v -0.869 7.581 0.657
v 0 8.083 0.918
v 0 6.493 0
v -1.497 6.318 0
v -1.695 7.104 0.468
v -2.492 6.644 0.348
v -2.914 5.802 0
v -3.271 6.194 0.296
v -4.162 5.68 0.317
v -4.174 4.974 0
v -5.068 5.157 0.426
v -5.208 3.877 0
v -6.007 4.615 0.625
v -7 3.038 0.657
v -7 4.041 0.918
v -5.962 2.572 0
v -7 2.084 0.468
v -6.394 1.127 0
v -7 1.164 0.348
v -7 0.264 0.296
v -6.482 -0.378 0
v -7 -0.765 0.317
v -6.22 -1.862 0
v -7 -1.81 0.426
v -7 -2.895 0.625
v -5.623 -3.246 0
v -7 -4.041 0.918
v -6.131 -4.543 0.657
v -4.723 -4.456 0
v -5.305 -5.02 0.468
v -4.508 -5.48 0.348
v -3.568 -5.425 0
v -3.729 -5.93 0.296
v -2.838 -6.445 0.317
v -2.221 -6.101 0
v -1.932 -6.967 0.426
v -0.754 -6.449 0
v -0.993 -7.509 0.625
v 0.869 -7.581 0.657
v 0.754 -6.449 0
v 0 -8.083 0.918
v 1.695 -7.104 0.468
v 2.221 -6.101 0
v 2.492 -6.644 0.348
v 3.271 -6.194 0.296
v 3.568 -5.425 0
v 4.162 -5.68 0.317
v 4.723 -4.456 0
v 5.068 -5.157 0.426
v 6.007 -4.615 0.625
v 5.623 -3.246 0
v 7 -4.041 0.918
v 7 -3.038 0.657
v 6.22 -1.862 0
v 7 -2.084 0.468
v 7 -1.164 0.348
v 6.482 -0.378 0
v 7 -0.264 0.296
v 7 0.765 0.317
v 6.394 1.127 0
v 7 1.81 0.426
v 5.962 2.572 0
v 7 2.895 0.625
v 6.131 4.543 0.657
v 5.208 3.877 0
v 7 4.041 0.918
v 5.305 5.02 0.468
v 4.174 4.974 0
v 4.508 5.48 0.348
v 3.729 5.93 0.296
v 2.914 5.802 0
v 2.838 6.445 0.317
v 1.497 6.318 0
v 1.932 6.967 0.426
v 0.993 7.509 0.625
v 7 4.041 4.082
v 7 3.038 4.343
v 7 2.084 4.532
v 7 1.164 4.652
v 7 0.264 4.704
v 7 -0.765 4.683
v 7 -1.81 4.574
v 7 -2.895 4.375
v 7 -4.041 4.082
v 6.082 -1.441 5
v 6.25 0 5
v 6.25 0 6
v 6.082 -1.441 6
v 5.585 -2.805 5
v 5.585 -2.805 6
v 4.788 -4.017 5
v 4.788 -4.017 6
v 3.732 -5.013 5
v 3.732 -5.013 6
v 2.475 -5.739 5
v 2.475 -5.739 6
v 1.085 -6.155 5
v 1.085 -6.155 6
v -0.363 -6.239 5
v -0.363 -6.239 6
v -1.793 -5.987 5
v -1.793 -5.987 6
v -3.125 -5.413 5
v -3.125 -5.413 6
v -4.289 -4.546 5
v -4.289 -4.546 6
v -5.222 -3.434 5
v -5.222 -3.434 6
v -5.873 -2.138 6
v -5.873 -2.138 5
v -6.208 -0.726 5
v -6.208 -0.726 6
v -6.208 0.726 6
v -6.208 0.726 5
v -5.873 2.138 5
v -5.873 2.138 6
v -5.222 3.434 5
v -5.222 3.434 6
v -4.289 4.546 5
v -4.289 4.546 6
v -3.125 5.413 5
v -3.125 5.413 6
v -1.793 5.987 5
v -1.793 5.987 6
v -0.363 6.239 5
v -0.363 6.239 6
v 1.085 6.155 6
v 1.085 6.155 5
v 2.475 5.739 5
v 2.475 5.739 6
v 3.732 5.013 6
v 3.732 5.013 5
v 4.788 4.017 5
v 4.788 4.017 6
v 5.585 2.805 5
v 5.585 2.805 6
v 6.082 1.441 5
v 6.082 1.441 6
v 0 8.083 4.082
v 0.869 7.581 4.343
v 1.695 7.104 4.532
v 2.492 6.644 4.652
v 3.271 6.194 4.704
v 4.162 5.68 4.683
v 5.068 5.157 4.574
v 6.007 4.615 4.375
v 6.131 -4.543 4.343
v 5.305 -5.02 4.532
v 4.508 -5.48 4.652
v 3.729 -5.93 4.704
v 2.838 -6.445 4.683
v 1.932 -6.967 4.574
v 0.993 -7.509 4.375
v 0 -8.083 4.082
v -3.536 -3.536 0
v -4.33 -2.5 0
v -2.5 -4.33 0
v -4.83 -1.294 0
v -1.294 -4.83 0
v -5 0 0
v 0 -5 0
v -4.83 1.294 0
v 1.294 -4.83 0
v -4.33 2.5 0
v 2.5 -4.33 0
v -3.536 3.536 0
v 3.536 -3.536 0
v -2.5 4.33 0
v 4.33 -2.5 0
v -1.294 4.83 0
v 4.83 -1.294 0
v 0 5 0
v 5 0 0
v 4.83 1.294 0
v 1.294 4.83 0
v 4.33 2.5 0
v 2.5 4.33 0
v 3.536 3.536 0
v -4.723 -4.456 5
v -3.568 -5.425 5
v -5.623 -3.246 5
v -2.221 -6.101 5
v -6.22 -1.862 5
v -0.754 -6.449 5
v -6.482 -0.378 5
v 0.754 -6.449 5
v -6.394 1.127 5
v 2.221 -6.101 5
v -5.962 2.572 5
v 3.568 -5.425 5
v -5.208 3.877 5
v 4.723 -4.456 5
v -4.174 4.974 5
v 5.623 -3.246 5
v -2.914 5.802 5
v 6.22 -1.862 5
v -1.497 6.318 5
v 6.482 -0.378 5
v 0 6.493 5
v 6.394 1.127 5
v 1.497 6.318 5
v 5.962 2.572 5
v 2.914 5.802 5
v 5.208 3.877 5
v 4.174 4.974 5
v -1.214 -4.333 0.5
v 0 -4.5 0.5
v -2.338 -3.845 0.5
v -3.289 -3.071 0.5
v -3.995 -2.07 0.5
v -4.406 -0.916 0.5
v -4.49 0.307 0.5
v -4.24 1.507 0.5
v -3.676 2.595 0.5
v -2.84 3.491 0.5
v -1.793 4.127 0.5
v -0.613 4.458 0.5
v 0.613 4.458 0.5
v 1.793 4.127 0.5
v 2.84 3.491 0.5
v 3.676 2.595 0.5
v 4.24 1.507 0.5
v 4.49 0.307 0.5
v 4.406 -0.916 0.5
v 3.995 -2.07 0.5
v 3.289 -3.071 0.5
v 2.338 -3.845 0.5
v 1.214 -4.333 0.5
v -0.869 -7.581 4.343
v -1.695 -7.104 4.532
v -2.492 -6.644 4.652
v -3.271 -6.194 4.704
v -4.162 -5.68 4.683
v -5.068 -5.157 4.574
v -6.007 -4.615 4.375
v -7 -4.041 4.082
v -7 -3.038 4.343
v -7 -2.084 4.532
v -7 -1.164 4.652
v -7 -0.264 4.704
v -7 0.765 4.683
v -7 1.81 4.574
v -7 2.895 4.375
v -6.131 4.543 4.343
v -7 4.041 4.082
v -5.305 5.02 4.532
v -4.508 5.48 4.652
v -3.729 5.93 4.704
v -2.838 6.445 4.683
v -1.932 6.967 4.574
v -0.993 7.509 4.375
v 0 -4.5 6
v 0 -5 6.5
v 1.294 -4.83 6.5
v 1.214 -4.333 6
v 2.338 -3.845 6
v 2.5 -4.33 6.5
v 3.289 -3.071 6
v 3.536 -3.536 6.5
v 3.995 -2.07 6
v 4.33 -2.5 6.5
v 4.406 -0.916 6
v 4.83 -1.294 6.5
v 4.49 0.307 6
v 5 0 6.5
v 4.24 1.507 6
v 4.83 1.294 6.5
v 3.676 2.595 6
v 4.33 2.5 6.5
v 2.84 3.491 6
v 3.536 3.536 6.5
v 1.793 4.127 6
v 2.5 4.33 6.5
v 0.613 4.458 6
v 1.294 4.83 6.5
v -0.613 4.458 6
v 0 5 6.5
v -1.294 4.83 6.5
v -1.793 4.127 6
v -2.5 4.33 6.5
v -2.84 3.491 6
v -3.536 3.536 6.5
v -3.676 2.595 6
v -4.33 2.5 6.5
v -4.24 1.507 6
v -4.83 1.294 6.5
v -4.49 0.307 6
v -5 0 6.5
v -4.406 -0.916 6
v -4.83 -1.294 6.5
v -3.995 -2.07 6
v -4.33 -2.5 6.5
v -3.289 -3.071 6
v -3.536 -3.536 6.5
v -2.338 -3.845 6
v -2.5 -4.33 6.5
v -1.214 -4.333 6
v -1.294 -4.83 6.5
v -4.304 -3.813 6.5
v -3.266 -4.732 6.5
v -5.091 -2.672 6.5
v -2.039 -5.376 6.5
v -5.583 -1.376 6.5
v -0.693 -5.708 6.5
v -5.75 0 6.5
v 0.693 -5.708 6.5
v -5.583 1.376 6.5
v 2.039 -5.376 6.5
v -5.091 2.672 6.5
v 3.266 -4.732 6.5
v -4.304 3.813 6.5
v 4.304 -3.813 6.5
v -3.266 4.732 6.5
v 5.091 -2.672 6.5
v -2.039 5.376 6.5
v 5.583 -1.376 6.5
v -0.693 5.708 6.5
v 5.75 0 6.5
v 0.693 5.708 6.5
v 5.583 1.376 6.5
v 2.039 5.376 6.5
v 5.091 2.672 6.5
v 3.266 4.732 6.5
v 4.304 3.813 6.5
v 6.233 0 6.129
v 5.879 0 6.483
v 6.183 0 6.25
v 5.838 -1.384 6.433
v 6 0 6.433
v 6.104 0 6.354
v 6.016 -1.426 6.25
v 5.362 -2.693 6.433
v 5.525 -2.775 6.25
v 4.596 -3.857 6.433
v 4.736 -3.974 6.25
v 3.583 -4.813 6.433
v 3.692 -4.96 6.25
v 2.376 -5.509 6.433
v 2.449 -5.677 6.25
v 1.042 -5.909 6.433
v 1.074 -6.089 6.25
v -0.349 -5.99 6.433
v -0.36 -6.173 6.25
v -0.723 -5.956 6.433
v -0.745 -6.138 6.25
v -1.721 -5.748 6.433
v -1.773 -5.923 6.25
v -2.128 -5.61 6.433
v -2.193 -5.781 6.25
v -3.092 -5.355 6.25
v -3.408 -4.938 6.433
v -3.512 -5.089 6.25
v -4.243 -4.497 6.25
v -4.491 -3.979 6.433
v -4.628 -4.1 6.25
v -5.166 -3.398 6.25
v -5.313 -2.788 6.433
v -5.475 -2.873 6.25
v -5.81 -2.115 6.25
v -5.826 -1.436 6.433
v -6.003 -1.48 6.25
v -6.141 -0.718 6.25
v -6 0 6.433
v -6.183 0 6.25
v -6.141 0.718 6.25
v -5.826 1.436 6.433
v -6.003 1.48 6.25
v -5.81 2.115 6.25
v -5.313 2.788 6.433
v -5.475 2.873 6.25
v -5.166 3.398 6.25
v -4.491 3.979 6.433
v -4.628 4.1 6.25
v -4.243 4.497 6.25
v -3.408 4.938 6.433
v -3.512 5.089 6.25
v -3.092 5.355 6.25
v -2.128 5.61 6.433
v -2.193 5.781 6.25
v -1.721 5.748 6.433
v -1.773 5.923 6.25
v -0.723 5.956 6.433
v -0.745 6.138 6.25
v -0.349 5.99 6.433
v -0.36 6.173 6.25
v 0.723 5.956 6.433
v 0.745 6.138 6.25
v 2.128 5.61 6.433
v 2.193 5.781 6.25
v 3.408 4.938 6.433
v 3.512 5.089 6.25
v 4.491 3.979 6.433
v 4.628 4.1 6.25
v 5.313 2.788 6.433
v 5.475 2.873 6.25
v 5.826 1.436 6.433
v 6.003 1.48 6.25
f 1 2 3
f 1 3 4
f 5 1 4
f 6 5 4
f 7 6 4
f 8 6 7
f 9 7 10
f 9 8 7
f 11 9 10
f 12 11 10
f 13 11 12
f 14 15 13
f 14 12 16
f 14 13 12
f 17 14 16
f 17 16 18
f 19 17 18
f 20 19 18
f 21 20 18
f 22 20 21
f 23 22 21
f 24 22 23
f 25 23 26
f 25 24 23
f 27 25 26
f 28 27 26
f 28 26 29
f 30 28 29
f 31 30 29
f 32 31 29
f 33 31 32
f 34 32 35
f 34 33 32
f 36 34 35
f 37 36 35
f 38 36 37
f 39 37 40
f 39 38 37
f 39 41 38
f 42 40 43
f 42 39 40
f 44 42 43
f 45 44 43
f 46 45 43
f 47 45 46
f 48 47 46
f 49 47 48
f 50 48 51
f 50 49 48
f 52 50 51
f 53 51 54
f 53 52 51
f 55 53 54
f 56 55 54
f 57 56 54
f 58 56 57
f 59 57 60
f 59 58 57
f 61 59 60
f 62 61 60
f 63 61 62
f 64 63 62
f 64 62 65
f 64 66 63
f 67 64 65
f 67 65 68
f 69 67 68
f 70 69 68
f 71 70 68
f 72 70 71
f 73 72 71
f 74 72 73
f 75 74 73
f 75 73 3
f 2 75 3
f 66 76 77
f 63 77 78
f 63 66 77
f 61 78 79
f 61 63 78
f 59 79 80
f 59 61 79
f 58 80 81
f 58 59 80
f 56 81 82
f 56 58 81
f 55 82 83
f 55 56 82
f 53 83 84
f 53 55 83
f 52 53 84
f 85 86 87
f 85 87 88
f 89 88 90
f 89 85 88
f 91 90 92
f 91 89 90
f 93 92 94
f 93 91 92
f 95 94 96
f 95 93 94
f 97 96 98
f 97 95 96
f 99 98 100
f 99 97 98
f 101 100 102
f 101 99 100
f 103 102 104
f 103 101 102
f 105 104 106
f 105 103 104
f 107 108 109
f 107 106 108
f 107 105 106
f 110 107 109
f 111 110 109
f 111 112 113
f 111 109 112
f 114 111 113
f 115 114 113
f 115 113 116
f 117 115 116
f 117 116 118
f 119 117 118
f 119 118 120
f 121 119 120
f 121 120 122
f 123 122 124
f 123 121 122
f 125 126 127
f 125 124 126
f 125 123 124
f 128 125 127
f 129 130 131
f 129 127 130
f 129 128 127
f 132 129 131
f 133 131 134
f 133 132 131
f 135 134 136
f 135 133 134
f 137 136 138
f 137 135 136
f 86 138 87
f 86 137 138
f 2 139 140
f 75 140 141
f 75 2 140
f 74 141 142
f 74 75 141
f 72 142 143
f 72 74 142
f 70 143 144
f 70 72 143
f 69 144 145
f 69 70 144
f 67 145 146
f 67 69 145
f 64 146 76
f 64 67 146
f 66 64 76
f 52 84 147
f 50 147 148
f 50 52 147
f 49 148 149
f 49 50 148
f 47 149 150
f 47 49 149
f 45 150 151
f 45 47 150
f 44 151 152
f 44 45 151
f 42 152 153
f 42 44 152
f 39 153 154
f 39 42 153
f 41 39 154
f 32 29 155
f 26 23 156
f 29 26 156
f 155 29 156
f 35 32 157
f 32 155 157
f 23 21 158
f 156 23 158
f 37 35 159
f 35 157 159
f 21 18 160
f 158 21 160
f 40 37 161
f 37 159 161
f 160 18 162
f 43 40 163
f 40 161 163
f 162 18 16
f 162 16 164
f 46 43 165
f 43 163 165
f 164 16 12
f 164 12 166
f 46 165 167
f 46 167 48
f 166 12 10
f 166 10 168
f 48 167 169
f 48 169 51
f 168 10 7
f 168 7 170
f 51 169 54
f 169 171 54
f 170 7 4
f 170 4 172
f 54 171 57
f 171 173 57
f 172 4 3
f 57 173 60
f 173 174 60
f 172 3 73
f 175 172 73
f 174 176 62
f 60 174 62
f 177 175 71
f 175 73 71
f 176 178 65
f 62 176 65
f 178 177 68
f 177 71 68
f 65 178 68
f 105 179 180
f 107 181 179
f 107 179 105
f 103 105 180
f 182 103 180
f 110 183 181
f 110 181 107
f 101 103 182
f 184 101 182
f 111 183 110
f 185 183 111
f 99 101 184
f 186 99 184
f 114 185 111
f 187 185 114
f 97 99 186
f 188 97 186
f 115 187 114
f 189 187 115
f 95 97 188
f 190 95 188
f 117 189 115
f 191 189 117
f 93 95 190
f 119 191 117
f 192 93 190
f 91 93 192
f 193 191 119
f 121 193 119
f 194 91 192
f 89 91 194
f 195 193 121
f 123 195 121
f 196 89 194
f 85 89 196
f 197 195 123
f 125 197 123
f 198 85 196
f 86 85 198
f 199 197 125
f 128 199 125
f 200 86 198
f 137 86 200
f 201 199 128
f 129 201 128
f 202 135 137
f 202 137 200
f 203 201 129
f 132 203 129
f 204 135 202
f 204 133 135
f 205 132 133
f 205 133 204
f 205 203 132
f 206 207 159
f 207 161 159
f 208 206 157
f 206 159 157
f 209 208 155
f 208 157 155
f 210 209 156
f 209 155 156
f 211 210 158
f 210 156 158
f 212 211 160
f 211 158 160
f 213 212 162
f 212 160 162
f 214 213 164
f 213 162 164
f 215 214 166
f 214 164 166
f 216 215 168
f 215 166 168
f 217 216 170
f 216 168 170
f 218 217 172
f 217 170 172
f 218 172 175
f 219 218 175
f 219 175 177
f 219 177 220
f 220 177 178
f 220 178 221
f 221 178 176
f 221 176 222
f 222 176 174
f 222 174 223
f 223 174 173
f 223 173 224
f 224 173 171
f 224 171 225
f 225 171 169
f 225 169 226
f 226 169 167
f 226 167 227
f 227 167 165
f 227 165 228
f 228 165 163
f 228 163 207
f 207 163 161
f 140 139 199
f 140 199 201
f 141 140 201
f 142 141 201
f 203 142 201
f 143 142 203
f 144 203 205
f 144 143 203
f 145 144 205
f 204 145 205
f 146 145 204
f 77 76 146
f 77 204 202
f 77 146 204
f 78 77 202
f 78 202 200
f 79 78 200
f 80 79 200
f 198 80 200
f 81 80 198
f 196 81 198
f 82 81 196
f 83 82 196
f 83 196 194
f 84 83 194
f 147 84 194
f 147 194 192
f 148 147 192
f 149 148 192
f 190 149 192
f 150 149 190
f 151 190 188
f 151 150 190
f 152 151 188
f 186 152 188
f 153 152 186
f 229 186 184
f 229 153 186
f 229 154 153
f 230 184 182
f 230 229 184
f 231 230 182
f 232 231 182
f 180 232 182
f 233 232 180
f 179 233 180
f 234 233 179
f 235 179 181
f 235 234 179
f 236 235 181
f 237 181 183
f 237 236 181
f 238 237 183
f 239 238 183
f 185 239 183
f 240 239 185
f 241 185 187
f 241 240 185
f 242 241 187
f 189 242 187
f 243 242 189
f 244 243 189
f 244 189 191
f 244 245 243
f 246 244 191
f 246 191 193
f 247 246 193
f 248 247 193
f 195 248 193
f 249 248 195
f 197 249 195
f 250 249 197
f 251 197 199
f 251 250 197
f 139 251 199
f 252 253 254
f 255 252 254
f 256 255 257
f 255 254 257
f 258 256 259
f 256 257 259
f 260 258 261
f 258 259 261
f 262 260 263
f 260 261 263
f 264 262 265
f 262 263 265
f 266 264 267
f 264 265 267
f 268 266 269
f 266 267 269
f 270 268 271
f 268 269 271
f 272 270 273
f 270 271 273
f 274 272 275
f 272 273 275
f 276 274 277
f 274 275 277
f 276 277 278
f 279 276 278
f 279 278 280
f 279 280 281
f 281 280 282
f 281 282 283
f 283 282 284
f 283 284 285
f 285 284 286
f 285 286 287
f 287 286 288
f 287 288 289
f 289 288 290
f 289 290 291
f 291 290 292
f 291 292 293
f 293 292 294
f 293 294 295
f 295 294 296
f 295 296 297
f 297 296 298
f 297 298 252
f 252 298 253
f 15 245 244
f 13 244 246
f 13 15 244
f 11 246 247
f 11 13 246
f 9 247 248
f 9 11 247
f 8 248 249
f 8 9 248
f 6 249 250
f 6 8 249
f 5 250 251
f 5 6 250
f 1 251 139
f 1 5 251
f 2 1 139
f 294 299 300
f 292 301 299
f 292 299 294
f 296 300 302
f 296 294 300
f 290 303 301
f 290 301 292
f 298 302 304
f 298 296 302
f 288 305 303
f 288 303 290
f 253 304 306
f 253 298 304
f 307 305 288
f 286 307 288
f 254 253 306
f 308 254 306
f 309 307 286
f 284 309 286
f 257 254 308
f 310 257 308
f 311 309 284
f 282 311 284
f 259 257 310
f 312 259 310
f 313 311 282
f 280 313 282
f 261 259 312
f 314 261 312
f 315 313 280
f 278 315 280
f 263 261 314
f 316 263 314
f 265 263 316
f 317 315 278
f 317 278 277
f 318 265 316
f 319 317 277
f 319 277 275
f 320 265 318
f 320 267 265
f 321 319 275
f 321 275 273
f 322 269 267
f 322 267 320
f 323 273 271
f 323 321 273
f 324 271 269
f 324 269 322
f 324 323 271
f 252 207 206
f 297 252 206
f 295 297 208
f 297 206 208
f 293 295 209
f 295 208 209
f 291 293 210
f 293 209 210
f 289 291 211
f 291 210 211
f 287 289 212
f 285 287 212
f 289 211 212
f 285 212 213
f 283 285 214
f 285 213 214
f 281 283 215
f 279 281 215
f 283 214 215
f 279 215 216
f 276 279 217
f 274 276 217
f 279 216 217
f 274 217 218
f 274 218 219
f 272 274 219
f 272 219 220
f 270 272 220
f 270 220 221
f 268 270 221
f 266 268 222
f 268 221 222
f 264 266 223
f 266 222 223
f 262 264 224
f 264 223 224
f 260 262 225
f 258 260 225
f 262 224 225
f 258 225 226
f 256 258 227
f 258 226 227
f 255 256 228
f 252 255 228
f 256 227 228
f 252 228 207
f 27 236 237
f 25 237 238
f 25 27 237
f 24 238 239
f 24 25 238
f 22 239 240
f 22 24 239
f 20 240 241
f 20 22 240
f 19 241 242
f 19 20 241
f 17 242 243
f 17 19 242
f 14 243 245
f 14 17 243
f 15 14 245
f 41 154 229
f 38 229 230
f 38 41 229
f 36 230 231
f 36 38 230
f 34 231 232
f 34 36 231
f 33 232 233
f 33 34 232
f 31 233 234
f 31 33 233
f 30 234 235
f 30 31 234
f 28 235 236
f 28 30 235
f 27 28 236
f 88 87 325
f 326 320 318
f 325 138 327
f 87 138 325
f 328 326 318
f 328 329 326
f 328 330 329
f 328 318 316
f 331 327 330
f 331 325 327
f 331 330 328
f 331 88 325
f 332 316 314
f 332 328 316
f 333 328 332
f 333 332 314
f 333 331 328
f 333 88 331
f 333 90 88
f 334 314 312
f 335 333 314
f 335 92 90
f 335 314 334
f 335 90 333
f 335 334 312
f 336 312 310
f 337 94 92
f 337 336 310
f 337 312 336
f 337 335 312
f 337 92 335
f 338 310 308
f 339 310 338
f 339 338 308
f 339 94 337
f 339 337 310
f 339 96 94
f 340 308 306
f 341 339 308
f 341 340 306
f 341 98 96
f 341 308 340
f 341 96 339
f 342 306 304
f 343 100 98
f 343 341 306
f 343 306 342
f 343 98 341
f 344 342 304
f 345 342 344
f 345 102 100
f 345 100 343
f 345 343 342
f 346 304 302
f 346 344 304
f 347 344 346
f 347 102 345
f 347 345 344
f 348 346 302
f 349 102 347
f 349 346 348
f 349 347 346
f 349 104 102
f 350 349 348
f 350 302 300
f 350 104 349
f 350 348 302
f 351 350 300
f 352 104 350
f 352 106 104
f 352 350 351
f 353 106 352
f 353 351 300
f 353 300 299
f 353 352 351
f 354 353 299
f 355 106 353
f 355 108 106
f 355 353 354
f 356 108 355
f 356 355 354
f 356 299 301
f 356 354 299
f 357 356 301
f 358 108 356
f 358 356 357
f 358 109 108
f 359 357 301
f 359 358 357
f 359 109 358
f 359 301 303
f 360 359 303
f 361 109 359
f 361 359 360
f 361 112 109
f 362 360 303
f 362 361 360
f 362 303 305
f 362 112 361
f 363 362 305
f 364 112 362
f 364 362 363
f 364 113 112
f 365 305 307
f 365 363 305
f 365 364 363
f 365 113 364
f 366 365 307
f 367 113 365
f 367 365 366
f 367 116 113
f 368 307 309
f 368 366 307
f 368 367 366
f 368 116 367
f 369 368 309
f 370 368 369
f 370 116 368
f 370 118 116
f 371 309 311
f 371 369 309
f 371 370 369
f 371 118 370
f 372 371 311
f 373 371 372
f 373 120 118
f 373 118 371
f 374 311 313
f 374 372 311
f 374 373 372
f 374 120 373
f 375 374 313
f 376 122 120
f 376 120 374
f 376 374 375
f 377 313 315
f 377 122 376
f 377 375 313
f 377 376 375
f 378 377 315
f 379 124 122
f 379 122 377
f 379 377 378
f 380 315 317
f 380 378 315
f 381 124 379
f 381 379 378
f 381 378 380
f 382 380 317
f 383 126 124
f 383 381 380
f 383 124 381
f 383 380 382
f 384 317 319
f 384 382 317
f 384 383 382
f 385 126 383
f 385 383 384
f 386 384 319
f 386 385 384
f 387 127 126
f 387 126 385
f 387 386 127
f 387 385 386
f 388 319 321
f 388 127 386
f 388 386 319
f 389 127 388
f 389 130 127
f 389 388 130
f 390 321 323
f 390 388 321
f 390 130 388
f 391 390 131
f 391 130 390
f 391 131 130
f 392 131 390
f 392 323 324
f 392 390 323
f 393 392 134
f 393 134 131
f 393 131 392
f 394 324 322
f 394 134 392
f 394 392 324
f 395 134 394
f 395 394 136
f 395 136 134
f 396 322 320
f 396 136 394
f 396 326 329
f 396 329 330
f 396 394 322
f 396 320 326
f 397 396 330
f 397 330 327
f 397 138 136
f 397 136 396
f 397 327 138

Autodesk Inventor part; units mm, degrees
ref_plane "YZ Plane" through (0, 0, 0) normal (1, 0, 0) x (0, 1, 0)
ref_plane "XZ Plane" through (0, 0, 0) normal (0, 1, 0) x (-1, 0, 0)
sketch "Schizzo1" plane through (0, 0, 0) normal (0, 0, 1) x (1, 0, 0)
  line L0 (0, 8.0829) -> (7, 4.0415)
  line L1 (7, 4.0415) -> (7, -4.0415)
  line L2 (7, -4.0415) -> (0, -8.0829)
  line L3 (0, -8.0829) -> (-7, -4.0415)
  line L4 (-7, -4.0415) -> (-7, 4.0415)
  line L5 (-7, 4.0415) -> (0, 8.0829)
  point P0 (0, 0)
  point P1 (0, 0)
  dimension "d0" = 14
extrude "Estrusione1" add sketch "Schizzo1" along normal blind 5
sketch "Schizzo2" plane through (0, 0, 5) normal (0, 0, 1) x (1, 0, 0)
  circle A0 centre (0, 0) radius 6.25
  dimension "d5" = 12.5
extrude "Estrusione2" add sketch "Schizzo2" along normal blind 1.5
sketch "Schizzo3" plane through (0, 0, 0) normal (1, 0, 0) x (0, 1, 0)
  line L0 (8.0829, 5) -> (4.0415, 5) projected
  line L1 (4.0415, 0) -> (4.0415, 5) projected
  line L2 (8.0829, 0) -> (4.0415, 0) projected
  line L3 (8.0829, 0) -> (8.0829, 5) projected
  line L4 (6.4929, 0) -> (8.0829, 0.918)
  line L5 (0, -0.8) -> (0, 4.8) projected
  line L6 (6.4929, 5) -> (8.0829, 4.082)
  line L7 (6.4929, 5) -> (8.0829, 5)
  line L8 (8.0829, 4.082) -> (8.0829, 5)
  point P0 (0, 0)
  dimension "d6" = 30
ref_plane "Piano di lavoro1" through (0, 0, 2) normal (0, 0, -1) x (-1, 0, 0)
sketch "Schizzo4" plane through (0, 0, 6.5) normal (0, 0, 1) x (1, 0, 0)
  circle A0 centre (0, 0) radius 6.25 projected
hole "Foro1" at (0, 0, 6.5) direction (0, 0, -1) diameter 9 end through all
thread "Filettatura1" size "M9x1.25" class "6H" standard "ANSI Metric M Profile" full length
chamfer "Smusso1" distance 0.5 angle 45 2 edges at (0, 4.5, 6.5) (0, 4.5, 0)
revolve "Rivoluzione2" cut sketch "Schizzo3" angle 360 about axis through (0, 0, -10) along (0, 0, 1) contours L3 L6 L0 | L3 L2 L4
fillet "Raccordo1" radius 0.5 1 edges at (-6.25, 0, 6.5)
properties part number "Dado 14"
